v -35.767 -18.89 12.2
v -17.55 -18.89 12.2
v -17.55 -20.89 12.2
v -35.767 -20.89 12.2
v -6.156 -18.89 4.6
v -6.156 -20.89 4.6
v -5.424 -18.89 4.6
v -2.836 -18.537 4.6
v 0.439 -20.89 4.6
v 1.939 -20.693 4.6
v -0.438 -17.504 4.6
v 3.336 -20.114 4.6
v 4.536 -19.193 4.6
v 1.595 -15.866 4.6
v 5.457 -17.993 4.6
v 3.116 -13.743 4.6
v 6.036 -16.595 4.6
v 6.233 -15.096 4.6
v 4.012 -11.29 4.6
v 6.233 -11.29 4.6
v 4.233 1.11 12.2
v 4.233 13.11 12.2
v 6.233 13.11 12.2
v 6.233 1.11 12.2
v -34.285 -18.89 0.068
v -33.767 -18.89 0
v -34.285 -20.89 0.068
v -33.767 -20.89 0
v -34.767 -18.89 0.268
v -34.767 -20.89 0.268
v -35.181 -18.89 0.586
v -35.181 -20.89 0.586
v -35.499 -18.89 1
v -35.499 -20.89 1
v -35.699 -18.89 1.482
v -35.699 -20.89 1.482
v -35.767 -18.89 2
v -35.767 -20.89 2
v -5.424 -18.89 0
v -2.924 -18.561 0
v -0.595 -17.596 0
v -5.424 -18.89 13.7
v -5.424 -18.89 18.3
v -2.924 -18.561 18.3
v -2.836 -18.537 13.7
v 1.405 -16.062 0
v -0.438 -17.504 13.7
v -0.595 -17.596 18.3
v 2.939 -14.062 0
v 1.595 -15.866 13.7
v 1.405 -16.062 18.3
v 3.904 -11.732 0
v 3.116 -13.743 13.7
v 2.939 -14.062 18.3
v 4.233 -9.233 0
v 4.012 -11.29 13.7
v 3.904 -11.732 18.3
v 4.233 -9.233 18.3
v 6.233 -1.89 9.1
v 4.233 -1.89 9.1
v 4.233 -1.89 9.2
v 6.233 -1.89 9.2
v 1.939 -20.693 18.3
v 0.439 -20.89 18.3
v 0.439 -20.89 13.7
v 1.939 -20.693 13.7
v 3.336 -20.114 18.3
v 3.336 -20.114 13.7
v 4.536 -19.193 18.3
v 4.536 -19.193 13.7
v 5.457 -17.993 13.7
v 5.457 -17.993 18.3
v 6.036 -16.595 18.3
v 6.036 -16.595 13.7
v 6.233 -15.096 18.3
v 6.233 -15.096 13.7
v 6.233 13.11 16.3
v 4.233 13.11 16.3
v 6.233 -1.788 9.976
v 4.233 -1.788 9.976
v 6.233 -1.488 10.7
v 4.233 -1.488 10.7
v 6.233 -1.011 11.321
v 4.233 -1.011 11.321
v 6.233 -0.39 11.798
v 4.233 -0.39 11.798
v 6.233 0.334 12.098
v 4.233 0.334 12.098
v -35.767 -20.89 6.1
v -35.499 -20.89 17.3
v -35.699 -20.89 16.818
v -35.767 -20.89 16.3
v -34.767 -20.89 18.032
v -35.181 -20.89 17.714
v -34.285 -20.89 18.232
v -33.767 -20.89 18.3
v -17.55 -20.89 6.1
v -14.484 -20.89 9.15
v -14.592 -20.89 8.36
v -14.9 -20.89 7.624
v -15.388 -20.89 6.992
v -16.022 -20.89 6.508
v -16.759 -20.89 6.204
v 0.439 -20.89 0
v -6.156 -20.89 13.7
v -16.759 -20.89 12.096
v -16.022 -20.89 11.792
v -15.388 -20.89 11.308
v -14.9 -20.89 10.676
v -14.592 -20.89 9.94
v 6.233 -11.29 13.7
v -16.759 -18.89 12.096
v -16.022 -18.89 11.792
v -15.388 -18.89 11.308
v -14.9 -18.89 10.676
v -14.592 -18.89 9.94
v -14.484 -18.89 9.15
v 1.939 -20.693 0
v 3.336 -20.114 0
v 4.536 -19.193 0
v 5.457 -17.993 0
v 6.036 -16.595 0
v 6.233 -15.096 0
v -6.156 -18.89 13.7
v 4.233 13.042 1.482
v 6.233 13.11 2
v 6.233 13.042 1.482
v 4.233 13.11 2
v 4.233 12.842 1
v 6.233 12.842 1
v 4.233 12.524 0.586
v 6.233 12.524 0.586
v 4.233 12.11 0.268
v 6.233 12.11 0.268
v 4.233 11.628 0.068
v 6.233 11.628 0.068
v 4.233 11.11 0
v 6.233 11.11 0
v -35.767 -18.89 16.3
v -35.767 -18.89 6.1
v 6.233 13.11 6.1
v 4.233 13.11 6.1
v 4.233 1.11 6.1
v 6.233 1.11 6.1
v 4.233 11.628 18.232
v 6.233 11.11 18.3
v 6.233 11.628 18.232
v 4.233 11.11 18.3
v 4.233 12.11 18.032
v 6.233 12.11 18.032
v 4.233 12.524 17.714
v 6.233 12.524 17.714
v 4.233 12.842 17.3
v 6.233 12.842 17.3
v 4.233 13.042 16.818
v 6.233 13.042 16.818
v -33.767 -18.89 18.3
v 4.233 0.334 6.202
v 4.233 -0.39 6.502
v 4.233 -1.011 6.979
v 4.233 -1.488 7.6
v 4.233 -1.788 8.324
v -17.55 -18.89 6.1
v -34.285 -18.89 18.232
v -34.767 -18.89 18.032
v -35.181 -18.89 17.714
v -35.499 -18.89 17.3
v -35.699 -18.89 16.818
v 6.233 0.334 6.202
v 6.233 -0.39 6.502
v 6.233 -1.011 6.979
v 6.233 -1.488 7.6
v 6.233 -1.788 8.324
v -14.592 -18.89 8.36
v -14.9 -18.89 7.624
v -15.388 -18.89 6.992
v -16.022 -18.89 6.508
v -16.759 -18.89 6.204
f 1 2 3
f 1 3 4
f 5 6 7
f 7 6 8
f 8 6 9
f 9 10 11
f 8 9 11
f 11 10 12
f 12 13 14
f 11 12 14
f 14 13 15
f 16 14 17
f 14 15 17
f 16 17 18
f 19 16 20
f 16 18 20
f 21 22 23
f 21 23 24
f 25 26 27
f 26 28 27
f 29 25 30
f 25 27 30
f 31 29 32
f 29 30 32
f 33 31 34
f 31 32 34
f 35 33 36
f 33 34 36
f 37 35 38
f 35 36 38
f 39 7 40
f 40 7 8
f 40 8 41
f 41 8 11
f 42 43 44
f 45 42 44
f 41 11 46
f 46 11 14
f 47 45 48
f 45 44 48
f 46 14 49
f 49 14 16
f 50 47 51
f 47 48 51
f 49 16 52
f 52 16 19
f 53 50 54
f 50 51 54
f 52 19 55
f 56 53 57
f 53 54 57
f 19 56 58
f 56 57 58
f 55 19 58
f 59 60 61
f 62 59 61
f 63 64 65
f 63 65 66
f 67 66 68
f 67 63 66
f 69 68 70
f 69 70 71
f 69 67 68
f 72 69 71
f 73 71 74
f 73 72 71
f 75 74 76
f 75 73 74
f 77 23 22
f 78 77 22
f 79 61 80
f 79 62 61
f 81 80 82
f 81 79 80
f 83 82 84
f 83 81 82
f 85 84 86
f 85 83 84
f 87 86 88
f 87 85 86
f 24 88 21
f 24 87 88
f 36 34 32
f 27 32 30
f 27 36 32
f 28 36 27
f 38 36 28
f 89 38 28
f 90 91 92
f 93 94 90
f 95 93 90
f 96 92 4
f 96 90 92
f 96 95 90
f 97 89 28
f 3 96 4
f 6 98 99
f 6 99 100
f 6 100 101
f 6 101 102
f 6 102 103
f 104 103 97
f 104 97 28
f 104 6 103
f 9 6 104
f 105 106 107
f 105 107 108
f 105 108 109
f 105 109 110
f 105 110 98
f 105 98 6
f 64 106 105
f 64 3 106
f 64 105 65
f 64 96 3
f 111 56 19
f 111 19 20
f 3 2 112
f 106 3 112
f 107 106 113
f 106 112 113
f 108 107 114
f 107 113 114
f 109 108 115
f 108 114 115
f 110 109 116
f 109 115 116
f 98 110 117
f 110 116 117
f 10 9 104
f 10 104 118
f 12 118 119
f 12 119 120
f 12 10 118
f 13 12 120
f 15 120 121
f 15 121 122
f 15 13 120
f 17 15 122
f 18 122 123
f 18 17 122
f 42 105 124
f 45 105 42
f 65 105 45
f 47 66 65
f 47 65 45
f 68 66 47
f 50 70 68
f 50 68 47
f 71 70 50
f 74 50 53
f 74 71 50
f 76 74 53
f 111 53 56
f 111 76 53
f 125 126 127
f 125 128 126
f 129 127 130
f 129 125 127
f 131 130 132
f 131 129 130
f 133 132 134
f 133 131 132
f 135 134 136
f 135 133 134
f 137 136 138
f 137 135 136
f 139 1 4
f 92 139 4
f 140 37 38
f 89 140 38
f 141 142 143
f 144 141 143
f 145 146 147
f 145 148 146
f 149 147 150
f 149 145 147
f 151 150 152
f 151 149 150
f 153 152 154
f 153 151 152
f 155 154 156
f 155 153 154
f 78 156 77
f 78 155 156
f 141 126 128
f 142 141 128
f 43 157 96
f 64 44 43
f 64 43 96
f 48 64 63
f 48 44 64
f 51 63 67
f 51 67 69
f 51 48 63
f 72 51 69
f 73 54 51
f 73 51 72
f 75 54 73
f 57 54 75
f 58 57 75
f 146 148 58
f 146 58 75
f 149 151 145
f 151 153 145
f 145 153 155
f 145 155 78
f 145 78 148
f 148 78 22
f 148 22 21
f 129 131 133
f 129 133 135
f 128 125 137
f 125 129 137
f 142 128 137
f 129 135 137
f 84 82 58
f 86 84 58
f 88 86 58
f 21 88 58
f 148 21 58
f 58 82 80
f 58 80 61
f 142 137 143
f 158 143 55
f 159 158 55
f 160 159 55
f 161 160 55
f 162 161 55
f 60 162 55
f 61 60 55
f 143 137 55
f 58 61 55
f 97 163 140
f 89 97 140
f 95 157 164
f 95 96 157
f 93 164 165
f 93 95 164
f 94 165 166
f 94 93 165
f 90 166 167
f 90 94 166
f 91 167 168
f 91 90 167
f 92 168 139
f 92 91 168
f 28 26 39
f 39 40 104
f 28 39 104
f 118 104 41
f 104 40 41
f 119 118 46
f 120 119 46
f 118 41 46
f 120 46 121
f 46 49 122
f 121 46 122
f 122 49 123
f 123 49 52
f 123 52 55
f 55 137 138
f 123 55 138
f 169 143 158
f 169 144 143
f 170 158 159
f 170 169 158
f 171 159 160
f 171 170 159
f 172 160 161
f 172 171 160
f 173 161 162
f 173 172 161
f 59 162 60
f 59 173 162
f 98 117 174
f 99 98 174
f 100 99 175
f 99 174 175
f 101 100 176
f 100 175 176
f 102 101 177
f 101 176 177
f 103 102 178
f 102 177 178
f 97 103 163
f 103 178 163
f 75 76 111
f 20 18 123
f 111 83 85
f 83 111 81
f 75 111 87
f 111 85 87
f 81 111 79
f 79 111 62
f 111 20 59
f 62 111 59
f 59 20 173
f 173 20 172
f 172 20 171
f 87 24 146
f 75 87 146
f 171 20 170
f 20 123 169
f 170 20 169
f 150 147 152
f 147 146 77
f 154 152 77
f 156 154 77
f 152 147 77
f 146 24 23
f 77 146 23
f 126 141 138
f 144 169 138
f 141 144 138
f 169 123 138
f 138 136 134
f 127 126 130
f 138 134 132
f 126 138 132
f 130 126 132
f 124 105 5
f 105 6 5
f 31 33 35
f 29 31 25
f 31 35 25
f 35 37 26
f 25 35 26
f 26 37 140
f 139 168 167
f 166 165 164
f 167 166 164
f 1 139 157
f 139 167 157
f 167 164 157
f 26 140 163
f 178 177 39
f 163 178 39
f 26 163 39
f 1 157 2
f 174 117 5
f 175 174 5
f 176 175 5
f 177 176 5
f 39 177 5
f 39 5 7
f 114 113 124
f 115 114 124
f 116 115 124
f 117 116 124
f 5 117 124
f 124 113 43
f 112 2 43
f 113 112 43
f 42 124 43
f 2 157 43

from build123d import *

# Parameters (mm, degrees)
F1_DEPTH     = 18.3
F2_W         = 17.3
F2_H         = 6.1
F3_DEPTH     = 25
F4_R         = 9.6568542495
F5_R         = 5.7941125497
F6_W         = 15
F6_H         = 6.1
F7_DEPTH     = 25
F8_R         = 3
F9_R         = 2
F11_DEPTH    = 7.6
F12_W        = 3.9829482868
F12_H        = 6.1
F13_DEPTH    = 25
F14_T1_DEPTH = 2
F15_DEPTH    = 1
F16_DEPTH    = 1
F17_DEPTH    = 2
F18_DEPTH    = 2
F19_DEPTH    = 0.5
F20_DEPTH    = 0.5


# Not quite as in the source:
# - a fillet or chamfer that OpenCascade refuses, or shapes differently, is made with other operations: its cross-section is extruded or revolved along the edge and cut away or added


with BuildPart() as f1:
    # F0 (on Top) → F1 (new body)
    with BuildSketch(Plane.XY):
        Polygon((4.2331174448, -18.8899510824), (-35.7668825552, -18.8899510824), (-35.7668825552, -20.8899510824), (6.2331174448, -20.8899510824), (6.2331174448, 13.1100489176), (4.2331174448, 13.1100489176), align=None)
    extrude(amount=F1_DEPTH)

    # F2 (on face) → F3 (cut)
    with BuildSketch(Plane(origin=(0, -18.8899510824, 0), x_dir=(-1, 0, 0), z_dir=(0, 1, 0))):
        with Locations((27.1168825552, 9.15)):
            Rectangle(F2_W, F2_H)
    extrude(amount=-F3_DEPTH, mode=Mode.SUBTRACT)

    # F4
    f4_edges = [f1.edges().sort_by_distance(p)[0] for p in [
        (4.233117, -18.889951, 9.15),
    ]]
    fillet(f4_edges, radius=F4_R)

    # F5
    f5_edges = [f1.edges().sort_by_distance(p)[0] for p in [
        (6.233117, -20.889951, 9.15),
    ]]
    fillet(f5_edges, radius=F5_R)

    # F6 (on face) → F7 (cut)
    with BuildSketch(Plane(origin=(4.2331174448, 0, 0), x_dir=(0, -1, 0), z_dir=(-1, 0, 0))):
        with Locations((-5.6100489176, 9.15)):
            Rectangle(F6_W, F6_H)
    extrude(amount=-F7_DEPTH, mode=Mode.SUBTRACT)

    # F8
    f8_edges = [f1.edges().sort_by_distance(p)[0] for p in [
        (5.233117, -1.889951, 6.1),
        (5.233117, -1.889951, 12.2),
    ]]
    fillet(f8_edges, radius=F8_R)

    # F9
    f9_edges = [f1.edges().sort_by_distance(p)[0] for p in [
        (5.233117, 13.110049, 0),
        (5.233117, 13.110049, 18.3),
        (-35.766883, -19.889951, 0),
        (-35.766883, -19.889951, 18.3),
    ]]
    fillet(f9_edges, radius=F9_R)

    # F10 (on face) → F11 (cut)
    with BuildSketch(Plane.XZ.offset(20.8899510824)):
        Polygon((7.5907320715, 6.1), (7.5907320715, 9.2), (7.5907320715, 12.2), (-4.1556255892, 12.2), (-4.1556255892, 6.1), align=None)
    extrude(amount=-F11_DEPTH, mode=Mode.SUBTRACT)

    # F12 (on face) → F13 (cut)
    with BuildSketch(Plane(origin=(0, -18.8899510824, 0), x_dir=(-1, 0, 0), z_dir=(0, 1, 0))):
        with Locations((16.4754084118, 9.15)):
            Rectangle(F12_W, F12_H)
    extrude(amount=-F13_DEPTH, mode=Mode.SUBTRACT)

    # F14: fillet of radius 3.0660512242 on 2 edges, made by hand

    # F14_s2 → F14_t1 (join)
    with BuildSketch(Plane.XZ.offset(18.8899510824)):
        with BuildLine():
            ThreePointArc((-14.4839342684, 9.1660512242), (-15.3819598805, 6.9980256121), (-17.5499854926, 6.1))
            Line((-17.5499854926, 6.1), (-14.4839342684, 6.1))
            Line((-14.4839342684, 6.1), (-14.4839342684, 9.1660512242))
        make_face()
        with BuildLine():
            ThreePointArc((-17.5499854926, 12.2), (-15.3819598805, 11.3019743879), (-14.4839342684, 9.1339487758))
            Line((-14.4839342684, 9.1339487758), (-14.4839342684, 12.2))
            Line((-14.4839342684, 12.2), (-17.5499854926, 12.2))
        make_face()
    extrude(amount=F14_T1_DEPTH)

    # F15 (cut): faces of the model
    f15_faces = [f1.faces().sort_by_distance(p)[0] for p in [
        (1.8734055755, -17.7191060476, 6.1),
        (1.8734055755, -17.7191060476, 12.2),
    ]]
    extrude(f15_faces, amount=-F15_DEPTH, dir=(0, 0, 1), mode=Mode.SUBTRACT)

    # F16 (cut): a face of the model
    f16_faces = [f1.faces().sort_by_distance(p)[0] for p in [
        (1.8734055755, -17.7191060476, 12.2),
    ]]
    extrude(f16_faces, amount=-F16_DEPTH, mode=Mode.SUBTRACT)

    # F17 (cut): a face of the model
    f17_faces = [f1.faces().sort_by_distance(p)[0] for p in [
        (-4.1556255892, -19.8481388351, 9.15),
    ]]
    extrude(f17_faces, amount=-F17_DEPTH, mode=Mode.SUBTRACT)

    # F18 (cut): a face of the model
    f18_faces = [f1.faces().sort_by_distance(p)[0] for p in [
        (4.7863785676, -13.2899510824, 9.15),
    ]]
    extrude(f18_faces, amount=-F18_DEPTH, mode=Mode.SUBTRACT)

    # F19 (cut): a face of the model
    f19_faces = [f1.faces().sort_by_distance(p)[0] for p in [
        (1.6308493787, -17.3698716383, 13.2),
    ]]
    extrude(f19_faces, amount=-F19_DEPTH, mode=Mode.SUBTRACT)

    # F20 (cut): a face of the model
    f20_faces = [f1.faces().sort_by_distance(p)[0] for p in [
        (1.6308493787, -17.3698716383, 5.1),
    ]]
    extrude(f20_faces, amount=-F20_DEPTH, mode=Mode.SUBTRACT)


solid = f1.part
